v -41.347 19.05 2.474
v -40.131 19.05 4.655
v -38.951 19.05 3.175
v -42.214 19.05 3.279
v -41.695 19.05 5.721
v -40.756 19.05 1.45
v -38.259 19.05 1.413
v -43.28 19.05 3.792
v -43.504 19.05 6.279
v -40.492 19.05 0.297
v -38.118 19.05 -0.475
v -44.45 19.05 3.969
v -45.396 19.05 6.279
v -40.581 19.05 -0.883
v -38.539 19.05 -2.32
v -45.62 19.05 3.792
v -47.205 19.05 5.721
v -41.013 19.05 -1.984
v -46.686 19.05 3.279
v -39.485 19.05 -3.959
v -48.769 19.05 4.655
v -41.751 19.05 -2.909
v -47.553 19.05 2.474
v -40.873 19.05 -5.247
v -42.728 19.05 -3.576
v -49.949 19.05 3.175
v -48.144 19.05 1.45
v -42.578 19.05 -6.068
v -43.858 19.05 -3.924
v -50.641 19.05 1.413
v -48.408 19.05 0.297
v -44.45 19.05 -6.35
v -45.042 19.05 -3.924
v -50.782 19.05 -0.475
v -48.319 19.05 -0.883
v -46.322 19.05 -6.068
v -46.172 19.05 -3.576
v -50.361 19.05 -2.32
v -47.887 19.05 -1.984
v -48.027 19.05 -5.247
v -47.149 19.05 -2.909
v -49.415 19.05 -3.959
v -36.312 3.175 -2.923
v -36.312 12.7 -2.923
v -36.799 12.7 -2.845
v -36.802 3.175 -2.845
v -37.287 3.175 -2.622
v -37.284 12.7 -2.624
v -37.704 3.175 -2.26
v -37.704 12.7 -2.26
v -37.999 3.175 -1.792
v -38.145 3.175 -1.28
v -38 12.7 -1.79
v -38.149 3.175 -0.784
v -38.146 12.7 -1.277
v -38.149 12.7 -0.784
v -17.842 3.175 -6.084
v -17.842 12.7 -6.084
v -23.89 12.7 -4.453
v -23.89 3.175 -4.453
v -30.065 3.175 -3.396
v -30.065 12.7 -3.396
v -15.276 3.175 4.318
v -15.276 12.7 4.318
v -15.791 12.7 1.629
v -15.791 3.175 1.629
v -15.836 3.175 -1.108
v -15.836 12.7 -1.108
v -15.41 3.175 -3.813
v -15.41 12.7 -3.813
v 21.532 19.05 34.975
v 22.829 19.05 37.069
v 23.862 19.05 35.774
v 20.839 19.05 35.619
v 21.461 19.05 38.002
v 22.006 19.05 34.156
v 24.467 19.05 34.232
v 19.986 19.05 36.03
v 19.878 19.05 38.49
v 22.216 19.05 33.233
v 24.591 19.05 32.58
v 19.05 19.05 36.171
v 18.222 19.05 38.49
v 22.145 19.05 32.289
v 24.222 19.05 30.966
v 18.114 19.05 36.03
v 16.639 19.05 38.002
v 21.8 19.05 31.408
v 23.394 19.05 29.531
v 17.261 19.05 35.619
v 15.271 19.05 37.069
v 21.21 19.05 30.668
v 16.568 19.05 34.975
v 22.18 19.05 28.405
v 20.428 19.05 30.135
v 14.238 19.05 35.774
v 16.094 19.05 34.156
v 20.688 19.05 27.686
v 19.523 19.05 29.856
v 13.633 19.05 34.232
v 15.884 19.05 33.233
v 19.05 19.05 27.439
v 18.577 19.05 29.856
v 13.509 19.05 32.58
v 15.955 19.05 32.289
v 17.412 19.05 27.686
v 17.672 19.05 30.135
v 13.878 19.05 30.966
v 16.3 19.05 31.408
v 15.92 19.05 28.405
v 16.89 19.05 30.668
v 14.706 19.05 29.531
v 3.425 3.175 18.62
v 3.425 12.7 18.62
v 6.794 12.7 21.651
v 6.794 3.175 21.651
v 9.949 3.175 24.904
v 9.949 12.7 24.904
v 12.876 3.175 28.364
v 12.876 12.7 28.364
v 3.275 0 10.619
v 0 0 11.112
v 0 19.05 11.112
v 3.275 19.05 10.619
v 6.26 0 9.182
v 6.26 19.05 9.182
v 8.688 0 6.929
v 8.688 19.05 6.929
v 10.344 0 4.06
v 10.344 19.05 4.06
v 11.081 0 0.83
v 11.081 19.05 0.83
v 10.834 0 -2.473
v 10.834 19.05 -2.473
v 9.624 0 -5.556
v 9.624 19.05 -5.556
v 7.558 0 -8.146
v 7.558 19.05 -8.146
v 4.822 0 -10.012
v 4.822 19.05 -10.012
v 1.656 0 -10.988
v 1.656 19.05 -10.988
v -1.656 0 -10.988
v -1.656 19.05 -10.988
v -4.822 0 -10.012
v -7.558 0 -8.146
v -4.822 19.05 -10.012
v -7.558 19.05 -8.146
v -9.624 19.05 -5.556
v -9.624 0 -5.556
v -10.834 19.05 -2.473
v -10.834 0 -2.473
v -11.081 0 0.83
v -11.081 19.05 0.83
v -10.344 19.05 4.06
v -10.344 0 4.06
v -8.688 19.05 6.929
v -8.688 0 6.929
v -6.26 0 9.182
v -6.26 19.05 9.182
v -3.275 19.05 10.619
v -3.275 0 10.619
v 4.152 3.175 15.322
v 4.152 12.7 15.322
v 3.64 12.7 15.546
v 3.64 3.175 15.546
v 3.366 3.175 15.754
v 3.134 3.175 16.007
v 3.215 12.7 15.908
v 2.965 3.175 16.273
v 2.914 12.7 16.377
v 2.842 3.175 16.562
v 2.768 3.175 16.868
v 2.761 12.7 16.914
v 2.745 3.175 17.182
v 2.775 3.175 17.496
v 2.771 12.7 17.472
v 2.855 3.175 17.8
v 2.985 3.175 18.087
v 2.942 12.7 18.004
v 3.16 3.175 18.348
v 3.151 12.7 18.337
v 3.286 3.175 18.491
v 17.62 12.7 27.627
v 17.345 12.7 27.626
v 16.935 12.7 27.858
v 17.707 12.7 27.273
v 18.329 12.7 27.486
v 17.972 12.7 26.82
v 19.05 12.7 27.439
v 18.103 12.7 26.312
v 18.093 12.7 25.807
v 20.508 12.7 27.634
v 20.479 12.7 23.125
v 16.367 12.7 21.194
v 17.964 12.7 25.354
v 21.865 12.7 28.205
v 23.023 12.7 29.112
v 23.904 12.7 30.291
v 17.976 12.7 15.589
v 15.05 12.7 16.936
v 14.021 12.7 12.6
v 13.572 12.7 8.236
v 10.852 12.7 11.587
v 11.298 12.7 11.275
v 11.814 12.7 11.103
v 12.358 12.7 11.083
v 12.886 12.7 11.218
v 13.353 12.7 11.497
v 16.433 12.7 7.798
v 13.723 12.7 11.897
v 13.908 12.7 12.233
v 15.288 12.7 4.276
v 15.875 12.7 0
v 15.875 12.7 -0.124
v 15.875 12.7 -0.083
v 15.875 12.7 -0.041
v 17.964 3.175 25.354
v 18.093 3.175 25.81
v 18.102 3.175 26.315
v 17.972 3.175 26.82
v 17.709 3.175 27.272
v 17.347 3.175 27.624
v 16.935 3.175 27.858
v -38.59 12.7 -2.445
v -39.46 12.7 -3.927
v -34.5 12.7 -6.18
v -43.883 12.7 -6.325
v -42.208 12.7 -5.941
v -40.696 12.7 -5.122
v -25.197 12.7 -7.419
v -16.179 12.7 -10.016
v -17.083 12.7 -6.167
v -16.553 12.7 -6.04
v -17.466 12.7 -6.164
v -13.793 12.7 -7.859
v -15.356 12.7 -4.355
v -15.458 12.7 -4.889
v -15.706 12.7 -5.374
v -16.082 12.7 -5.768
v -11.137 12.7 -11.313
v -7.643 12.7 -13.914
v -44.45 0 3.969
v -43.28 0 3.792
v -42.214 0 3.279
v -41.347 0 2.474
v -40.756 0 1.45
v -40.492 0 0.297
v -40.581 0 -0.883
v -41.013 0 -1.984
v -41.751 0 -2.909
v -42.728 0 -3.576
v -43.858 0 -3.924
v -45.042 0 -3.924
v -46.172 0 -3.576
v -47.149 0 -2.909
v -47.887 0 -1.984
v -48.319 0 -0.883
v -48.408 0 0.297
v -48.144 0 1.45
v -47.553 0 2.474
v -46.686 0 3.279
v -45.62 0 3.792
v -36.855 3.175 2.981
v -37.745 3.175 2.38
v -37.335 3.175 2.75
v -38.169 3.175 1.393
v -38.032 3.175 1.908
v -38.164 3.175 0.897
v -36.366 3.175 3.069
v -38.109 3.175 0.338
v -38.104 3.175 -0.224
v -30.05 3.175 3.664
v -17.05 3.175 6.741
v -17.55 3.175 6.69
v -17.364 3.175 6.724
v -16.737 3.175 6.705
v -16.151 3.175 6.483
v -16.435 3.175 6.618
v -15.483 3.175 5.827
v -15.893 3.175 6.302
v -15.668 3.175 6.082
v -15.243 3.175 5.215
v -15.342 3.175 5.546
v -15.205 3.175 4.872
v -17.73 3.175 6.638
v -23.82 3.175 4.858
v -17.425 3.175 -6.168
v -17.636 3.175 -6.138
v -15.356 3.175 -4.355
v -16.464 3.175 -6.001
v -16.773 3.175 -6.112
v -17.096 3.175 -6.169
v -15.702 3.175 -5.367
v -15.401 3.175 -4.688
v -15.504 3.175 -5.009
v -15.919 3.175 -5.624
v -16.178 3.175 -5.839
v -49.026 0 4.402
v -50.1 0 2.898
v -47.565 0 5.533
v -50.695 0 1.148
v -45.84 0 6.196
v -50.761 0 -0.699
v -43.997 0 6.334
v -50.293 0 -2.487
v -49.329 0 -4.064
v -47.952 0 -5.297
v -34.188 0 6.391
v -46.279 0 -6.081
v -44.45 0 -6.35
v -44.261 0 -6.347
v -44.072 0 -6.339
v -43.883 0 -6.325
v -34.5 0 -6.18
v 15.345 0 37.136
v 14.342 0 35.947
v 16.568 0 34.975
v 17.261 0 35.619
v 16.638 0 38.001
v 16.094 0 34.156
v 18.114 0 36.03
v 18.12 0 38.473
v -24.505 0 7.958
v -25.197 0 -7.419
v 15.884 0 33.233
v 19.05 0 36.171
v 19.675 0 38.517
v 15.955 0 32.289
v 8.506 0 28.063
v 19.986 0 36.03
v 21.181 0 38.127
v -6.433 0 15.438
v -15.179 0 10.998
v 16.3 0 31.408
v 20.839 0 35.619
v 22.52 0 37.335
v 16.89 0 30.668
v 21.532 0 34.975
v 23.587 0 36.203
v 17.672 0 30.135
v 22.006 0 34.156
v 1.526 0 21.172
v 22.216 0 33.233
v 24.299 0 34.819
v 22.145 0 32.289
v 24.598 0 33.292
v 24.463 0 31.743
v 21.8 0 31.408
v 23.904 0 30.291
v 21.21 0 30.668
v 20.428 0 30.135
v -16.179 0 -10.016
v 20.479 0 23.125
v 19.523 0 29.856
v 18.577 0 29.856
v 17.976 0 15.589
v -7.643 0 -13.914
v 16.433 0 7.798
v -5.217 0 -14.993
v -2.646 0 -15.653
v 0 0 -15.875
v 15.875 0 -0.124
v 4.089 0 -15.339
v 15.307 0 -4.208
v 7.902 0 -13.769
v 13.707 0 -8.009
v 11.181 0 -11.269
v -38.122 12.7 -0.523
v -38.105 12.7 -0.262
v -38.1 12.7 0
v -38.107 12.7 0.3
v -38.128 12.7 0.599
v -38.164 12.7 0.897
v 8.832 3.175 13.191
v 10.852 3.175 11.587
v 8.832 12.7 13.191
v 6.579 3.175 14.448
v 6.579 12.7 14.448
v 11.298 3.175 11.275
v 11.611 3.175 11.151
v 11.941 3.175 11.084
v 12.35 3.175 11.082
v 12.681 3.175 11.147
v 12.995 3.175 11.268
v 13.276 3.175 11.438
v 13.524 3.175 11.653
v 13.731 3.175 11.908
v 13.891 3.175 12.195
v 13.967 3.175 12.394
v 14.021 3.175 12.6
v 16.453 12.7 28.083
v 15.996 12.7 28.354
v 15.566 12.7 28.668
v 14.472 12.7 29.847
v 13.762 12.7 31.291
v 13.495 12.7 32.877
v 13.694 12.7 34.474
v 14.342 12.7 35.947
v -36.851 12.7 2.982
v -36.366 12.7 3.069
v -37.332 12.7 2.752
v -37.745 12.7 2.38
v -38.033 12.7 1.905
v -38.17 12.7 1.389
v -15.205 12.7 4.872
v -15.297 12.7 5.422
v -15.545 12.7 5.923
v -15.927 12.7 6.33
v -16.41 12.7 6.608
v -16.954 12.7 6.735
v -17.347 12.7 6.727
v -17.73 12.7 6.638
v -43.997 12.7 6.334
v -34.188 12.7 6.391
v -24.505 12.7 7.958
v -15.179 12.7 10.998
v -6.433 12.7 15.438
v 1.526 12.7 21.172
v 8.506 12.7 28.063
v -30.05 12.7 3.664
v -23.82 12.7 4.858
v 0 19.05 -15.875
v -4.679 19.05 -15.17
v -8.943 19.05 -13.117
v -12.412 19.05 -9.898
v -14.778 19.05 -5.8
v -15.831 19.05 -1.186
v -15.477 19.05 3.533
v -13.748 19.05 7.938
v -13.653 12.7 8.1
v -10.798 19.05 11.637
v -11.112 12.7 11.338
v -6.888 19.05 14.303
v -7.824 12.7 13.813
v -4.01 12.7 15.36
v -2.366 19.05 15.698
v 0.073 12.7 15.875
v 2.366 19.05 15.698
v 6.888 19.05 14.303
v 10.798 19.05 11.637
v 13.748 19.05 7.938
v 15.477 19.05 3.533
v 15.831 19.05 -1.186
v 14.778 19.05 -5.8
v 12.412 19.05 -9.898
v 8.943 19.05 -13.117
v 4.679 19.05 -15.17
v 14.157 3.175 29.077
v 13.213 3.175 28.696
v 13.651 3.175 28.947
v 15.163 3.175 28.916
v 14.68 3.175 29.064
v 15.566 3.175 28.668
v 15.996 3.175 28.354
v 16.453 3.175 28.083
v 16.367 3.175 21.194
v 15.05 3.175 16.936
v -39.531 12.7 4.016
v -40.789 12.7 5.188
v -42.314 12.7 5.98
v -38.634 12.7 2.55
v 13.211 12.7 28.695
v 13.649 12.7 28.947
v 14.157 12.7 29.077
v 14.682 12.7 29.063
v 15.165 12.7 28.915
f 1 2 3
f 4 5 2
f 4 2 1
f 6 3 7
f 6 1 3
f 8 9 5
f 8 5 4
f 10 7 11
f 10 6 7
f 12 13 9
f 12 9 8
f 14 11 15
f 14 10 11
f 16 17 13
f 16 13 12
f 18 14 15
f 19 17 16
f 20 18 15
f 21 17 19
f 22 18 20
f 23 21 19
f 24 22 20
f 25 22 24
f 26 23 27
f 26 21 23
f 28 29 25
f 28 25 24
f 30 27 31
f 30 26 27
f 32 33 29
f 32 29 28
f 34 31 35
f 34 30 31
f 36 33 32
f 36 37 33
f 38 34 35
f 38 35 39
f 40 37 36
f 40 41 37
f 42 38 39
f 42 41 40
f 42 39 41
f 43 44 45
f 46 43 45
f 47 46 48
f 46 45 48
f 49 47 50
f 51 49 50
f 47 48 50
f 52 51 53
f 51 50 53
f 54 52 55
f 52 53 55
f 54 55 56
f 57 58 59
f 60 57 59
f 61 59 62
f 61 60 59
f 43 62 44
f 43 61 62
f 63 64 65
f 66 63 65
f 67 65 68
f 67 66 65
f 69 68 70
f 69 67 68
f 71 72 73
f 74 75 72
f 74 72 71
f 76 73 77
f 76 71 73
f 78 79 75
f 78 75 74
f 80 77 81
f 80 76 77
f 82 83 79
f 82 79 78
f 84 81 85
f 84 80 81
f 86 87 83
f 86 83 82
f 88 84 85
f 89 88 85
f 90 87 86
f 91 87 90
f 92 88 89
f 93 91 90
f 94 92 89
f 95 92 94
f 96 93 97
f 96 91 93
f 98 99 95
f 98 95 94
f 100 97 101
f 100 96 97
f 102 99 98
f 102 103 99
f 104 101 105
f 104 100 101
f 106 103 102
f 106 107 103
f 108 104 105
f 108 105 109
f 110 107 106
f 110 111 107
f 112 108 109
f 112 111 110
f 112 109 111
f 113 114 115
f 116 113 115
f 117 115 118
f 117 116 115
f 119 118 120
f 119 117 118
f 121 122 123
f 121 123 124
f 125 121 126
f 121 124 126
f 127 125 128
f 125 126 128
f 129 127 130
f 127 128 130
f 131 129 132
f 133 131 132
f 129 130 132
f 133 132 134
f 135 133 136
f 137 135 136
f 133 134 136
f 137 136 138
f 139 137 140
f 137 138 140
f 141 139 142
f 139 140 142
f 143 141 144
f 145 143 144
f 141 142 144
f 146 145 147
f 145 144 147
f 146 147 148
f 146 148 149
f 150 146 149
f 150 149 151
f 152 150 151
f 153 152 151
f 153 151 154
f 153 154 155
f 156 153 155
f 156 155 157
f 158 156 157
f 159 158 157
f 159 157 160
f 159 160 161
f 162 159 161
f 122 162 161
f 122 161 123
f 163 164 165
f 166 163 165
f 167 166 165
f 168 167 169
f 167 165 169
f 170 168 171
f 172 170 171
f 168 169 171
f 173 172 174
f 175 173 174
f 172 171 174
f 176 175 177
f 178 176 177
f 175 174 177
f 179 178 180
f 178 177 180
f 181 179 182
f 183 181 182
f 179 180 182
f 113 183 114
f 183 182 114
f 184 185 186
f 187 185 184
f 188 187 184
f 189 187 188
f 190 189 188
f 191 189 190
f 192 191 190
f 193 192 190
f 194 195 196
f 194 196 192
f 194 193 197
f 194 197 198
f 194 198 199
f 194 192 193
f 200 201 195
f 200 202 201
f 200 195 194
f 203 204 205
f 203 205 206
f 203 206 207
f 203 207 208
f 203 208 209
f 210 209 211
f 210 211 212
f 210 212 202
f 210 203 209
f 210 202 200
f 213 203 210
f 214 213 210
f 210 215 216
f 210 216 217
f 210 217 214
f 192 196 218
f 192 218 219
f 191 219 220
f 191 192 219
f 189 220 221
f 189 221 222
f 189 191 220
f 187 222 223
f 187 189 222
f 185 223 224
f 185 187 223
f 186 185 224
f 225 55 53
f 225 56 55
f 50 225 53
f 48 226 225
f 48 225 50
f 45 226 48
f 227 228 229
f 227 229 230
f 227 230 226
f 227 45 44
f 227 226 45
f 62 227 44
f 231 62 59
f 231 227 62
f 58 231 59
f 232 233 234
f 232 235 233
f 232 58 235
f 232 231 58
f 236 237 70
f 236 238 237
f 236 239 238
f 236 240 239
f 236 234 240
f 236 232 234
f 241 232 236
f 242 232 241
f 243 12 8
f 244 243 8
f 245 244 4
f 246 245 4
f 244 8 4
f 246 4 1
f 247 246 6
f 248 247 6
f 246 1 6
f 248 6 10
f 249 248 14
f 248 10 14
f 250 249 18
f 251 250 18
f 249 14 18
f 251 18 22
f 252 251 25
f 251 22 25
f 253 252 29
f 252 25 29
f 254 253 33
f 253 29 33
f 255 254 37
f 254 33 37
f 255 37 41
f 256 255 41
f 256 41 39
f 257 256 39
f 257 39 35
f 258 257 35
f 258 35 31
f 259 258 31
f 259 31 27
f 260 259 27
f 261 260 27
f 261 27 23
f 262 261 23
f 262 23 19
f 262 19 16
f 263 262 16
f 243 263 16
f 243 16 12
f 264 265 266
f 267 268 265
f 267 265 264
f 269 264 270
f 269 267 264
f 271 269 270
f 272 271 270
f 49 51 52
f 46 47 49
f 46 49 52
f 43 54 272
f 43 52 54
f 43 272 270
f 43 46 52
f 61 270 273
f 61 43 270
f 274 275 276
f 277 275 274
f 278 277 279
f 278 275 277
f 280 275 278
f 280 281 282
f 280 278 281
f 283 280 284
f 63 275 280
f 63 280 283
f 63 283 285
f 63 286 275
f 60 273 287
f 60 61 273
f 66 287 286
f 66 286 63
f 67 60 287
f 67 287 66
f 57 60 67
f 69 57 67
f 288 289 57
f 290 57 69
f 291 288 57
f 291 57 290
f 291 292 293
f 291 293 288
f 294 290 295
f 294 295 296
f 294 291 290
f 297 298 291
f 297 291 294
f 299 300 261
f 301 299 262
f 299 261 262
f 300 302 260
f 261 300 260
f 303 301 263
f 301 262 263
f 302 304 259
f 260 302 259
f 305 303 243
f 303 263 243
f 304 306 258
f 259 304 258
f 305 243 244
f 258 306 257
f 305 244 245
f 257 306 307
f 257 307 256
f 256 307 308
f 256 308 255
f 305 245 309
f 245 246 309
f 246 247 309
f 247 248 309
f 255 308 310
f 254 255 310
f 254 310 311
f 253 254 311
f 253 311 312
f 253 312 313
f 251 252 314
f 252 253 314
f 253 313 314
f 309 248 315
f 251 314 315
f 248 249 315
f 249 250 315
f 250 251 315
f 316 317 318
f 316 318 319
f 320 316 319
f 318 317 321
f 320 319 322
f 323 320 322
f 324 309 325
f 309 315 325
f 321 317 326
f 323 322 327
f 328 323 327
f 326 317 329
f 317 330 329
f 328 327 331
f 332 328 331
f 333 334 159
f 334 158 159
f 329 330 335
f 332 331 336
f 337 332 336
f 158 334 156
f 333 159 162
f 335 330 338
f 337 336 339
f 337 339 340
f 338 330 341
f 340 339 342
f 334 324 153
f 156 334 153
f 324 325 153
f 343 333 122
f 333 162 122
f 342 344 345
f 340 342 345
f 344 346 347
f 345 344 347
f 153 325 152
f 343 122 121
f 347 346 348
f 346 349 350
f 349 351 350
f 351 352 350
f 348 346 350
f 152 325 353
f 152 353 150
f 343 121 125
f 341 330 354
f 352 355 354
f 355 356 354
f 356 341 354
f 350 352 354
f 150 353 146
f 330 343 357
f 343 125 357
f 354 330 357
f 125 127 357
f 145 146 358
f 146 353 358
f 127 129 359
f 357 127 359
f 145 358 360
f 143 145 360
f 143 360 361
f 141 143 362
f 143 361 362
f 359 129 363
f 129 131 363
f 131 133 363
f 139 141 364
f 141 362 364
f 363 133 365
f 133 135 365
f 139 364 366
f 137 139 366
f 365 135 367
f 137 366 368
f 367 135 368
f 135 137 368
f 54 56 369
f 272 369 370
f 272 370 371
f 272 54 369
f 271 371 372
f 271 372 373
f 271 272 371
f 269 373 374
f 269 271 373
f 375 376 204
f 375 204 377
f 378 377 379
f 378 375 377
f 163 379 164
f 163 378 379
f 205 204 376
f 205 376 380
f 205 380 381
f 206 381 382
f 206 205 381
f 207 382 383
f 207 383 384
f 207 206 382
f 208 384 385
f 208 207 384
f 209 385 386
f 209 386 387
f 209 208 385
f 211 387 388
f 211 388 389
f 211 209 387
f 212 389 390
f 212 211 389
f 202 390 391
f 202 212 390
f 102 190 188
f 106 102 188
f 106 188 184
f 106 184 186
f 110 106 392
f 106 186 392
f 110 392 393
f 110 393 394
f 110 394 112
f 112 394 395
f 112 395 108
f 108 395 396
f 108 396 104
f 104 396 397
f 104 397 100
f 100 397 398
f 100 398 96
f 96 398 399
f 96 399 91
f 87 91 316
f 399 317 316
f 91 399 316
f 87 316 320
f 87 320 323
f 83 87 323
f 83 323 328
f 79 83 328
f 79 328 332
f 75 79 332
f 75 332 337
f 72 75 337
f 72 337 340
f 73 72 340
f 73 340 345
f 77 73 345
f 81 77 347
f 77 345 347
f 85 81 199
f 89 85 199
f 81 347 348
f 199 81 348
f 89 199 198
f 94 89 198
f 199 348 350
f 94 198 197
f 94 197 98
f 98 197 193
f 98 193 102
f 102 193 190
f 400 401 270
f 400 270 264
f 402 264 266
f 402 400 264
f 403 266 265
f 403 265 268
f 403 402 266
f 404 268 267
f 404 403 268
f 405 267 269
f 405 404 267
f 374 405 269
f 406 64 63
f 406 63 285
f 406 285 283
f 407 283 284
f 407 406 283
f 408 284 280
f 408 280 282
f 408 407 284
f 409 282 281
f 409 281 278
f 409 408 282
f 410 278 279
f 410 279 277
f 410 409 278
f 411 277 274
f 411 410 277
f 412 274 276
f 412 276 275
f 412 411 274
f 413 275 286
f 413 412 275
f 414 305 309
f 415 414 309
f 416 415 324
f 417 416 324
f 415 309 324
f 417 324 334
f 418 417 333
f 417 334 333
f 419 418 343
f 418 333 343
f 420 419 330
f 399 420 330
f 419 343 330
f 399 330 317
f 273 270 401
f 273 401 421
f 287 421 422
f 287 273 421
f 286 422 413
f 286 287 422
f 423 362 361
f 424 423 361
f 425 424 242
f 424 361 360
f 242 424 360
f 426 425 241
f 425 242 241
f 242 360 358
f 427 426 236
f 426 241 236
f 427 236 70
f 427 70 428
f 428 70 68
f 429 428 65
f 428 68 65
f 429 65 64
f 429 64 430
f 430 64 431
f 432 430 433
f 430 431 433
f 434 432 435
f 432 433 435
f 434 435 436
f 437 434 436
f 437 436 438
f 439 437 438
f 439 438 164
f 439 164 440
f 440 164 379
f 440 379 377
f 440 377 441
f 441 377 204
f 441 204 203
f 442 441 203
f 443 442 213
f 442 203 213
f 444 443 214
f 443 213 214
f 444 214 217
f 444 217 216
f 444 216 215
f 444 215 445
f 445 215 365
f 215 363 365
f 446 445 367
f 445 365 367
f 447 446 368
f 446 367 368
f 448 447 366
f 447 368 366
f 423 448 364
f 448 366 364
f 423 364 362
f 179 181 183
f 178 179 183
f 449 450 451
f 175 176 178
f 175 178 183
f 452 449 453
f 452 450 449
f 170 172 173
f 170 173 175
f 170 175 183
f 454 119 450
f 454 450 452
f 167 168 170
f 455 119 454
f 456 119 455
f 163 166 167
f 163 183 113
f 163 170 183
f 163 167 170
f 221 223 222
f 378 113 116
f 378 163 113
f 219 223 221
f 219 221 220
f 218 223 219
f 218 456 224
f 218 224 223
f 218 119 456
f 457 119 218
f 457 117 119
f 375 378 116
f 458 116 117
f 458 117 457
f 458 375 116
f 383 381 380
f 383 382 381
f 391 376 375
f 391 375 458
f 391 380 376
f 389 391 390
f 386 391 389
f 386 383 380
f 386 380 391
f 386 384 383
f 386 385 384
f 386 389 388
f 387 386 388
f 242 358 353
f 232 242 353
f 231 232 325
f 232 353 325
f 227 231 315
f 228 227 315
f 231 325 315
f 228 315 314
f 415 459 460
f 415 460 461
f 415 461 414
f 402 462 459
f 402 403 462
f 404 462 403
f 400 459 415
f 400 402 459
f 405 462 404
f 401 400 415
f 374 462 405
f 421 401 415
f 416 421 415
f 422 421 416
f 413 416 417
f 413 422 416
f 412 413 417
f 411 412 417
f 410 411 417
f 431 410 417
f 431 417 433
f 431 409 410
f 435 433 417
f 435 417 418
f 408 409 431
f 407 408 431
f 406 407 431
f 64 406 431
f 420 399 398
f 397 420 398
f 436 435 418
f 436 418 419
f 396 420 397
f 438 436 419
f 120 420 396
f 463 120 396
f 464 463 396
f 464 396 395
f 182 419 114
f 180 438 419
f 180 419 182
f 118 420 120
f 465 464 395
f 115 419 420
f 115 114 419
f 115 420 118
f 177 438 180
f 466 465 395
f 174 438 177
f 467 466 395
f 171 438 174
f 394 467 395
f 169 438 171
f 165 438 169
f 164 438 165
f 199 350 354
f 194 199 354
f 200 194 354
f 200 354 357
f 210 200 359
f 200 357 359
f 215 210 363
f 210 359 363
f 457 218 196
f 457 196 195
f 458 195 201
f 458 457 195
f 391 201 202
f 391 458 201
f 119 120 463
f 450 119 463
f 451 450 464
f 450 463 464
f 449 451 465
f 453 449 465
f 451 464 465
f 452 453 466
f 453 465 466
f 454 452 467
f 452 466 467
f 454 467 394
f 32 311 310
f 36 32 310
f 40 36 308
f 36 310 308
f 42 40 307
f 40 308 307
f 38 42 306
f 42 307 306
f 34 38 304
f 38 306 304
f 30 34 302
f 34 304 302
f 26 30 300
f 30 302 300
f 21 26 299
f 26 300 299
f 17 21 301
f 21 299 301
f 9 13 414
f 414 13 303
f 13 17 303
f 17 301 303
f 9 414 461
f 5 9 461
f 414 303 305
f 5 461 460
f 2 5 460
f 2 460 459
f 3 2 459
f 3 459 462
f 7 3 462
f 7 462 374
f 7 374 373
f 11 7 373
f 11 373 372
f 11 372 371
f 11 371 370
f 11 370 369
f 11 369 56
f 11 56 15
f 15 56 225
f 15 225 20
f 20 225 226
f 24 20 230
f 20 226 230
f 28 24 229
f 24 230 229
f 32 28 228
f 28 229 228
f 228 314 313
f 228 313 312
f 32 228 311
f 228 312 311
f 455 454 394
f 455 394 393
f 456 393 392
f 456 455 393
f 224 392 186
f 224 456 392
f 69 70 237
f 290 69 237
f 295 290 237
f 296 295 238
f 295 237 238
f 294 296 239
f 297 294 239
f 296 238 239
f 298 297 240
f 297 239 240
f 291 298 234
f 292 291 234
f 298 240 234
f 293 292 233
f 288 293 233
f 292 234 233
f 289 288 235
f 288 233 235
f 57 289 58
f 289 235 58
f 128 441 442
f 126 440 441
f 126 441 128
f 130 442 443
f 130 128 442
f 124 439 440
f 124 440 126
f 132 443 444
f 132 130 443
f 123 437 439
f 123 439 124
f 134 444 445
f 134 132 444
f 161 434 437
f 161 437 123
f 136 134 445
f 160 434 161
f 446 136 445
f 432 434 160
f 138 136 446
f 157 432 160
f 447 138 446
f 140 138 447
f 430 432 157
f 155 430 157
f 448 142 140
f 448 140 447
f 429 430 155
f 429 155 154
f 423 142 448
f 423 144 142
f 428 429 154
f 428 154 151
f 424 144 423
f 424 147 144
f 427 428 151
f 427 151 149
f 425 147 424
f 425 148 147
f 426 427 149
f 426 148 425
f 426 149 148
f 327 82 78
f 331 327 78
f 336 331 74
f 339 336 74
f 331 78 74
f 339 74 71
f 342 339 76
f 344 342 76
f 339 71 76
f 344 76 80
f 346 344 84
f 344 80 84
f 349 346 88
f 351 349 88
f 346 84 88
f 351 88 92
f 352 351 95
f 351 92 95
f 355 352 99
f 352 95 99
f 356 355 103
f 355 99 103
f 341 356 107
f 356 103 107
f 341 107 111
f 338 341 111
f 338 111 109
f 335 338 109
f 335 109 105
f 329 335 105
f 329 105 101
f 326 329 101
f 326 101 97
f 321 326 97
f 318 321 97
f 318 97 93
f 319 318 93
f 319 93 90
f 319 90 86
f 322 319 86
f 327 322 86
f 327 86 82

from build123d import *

# Parameters (mm, degrees)
SKETCH8_R             = 6.35
BOSS_EXTRUDE7_DEPTH   = 19.05
SKETCH8_R_2           = 15.875
BOSS_EXTRUDE7_2_DEPTH = 19.05
SKETCH8_R_3           = 5.55625
BOSS_EXTRUDE7_3_DEPTH = 19.05
BOSS_EXTRUDE8_DEPTH   = 12.7
SKETCH9_R             = 3.175
SKETCH9_R_2           = 12.7
SKETCH9_R_3           = 2.38125
CUT_EXTRUDE3_DEPTH    = 67.556631241
SHELL3_START          = 3.175
SHELL3_DEPTH          = 9.525
SKETCH11_R            = 15.875
BOSS_EXTRUDE9_DEPTH   = 19.05
SKETCH12_R            = 3.96875
SKETCH12_R_2          = 11.1125
SKETCH12_R_3          = 3.175
CUT_EXTRUDE4_DEPTH    = 67.556631241
FILLET1_R             = 1.905


# Read off the part's stored shape, not the designer's step: Shell3
with BuildPart() as part:
    # Sketch8 → Boss-Extrude7 (new body)
    with BuildSketch(Plane(origin=(0, 0, 0), x_dir=(1, 0, 0), z_dir=(0, 1, 0))):
        with Locations(Location((-44.45, 0, 0), (0, 0, 90))):
            Circle(SKETCH8_R)
    extrude(amount=BOSS_EXTRUDE7_DEPTH)



with BuildPart() as body_2:
    # Sketch8 → Boss-Extrude7 2 (new body)
    with BuildSketch(Plane(origin=(0, 0, 0), x_dir=(1, 0, 0), z_dir=(0, 1, 0))):
        with Locations(Location((0, 0, 0), (0, 0, 90))):
            Circle(SKETCH8_R_2)
    extrude(amount=BOSS_EXTRUDE7_2_DEPTH)


with BuildPart() as body_3:
    # Sketch8 → Boss-Extrude7 3 (new body)
    with BuildSketch(Plane(origin=(0, 0, 0), x_dir=(1, 0, 0), z_dir=(0, 1, 0))):
        with Locations(Location((19.05, -32.995567884, 0), (0, 0, 90))):
            Circle(SKETCH8_R_3)
    extrude(amount=BOSS_EXTRUDE7_3_DEPTH)


with BuildPart() as part_1:
    add(part.part)

    add(body_2.part)  # Boss-Extrude8 merges body 2

    add(body_3.part)  # Boss-Extrude8 merges body 3
    # Sketch1 → Boss-Extrude8 (add)
    with BuildSketch(Plane(origin=(0, 0, 0), x_dir=(1, 0, 0), z_dir=(0, 1, 0))):
        with BuildLine():
            ThreePointArc((15.874516986, 0.123836405), (15.874879246, 0.061918673), (15.875, 0))
            ThreePointArc((15.875, 0), (-8.083566746, -13.662780598), (-7.642678571, 13.914204586))
            ThreePointArc((-7.642678571, 13.914204586), (-25.197394313, 7.419323178), (-43.883035714, 6.324638448))
            ThreePointArc((-43.883035714, 6.324638448), (-39.763704917, 4.284989894), (-38.1, 0))
            ThreePointArc((-38.1, 0), (-39.80230939, -4.326831634), (-43.996526612, -6.333787326))
            ThreePointArc((-43.996526612, -6.333787326), (-10.719971263, -13.048717363), (14.342154608, -35.946517871))
            ThreePointArc((14.342154608, -35.946517871), (16.221269303, -28.213288437), (23.903541316, -30.290932834))
            ThreePointArc((23.903541316, -30.290932834), (17.975858999, -15.588595272), (15.874516986, 0.123836405))
        make_face()
    extrude(amount=BOSS_EXTRUDE8_DEPTH)

    # Sketch9 → Cut-Extrude3 (cut, through all)
    with BuildSketch(Plane(origin=(0, 19.05, 0), x_dir=(1, 0, 0), z_dir=(0, 1, 0))):
        with Locations(Location((-44.45, 0, 0), (0, 0, 270))):
            Circle(SKETCH9_R)
        with Locations(Location((0, 0, 0), (0, 0, 270))):
            Circle(SKETCH9_R_2)
        with Locations(Location((19.05, -32.995567884, 0), (0, 0, 270))):
            Circle(SKETCH9_R_3)
    extrude(amount=-CUT_EXTRUDE3_DEPTH, mode=Mode.SUBTRACT)

    # Shell3 outline → Shell3 (cut)
    with BuildSketch(Plane(origin=(0, 0, 0), x_dir=(1, 0, 0), z_dir=(0, 1, 0)).offset(SHELL3_START)):
        with BuildLine():
            ThreePointArc((-38.800169089, 2.898604954), (-38.1002552, -0.05692953), (-38.853048837, -2.999439561))
            ThreePointArc((-38.853048837, -2.999439561), (-25.959917491, -4.378054539), (-13.577434664, -8.226110438))
            ThreePointArc((-13.577434664, -8.226110438), (-15.868541202, -0.452796995), (-14.024412997, 7.438512289))
            ThreePointArc((-14.024412997, 7.438512289), (-26.19595995, 3.987969239), (-38.800169089, 2.898604954))
        make_face()
        with BuildLine():
            ThreePointArc((13.339048882, -8.607287606), (7.563042072, -13.957650935), (-0.073256974, -15.874830973))
            ThreePointArc((-0.073256974, -15.874830973), (7.639502671, -22.480309716), (14.259701701, -30.180437999))
            ThreePointArc((14.259701701, -30.180437999), (16.221269303, -28.213288437), (18.889968849, -27.441622971))
            ThreePointArc((18.889968849, -27.441622971), (15.417387842, -18.229913189), (13.339048882, -8.607287606))
        make_face()
    extrude(amount=SHELL3_DEPTH, mode=Mode.SUBTRACT)

    # Sketch11 → Boss-Extrude9 (add)
    with BuildSketch(Plane(origin=(0, 0, 0), x_dir=(1, 0, 0), z_dir=(0, 1, 0))):
        with Locations(Location((0, 0, 0), (0, 0, 118.778745897))):
            Circle(SKETCH11_R)
    extrude(amount=BOSS_EXTRUDE9_DEPTH)

    # Sketch12 → Cut-Extrude4 (cut, through all)
    with BuildSketch(Plane(origin=(0, 19.05, 0), x_dir=(1, 0, 0), z_dir=(0, 1, 0))):
        with Locations(Location((-44.45, 0, 0), (0, 0, 270))):
            Circle(SKETCH12_R)
        with Locations(Location((0, 0, 0), (0, 0, 270))):
            Circle(SKETCH12_R_2)
        with Locations(Location((19.05, -32.995567884, 0), (0, 0, 270))):
            Circle(SKETCH12_R_3)
    extrude(amount=-CUT_EXTRUDE4_DEPTH, mode=Mode.SUBTRACT)

    # Fillet1
    fillet1_edges = [part_1.edges().sort_by_distance(p)[0] for p in [
        (18.889968849, 7.9375, 27.441622971),
        (14.259701701, 7.9375, 30.180437999),
        (-0.073256974, 7.9375, 15.874830973),
        (13.339048882, 7.9375, 8.607287606),
        (-14.024412997, 7.9375, -7.438512289),
        (-13.577434664, 7.9375, 8.226110438),
        (-38.800169089, 7.9375, -2.898604954),
        (-38.853048837, 7.9375, 2.999439561),
    ]]
    fillet(fillet1_edges, radius=FILLET1_R)


solid = part_1.part
